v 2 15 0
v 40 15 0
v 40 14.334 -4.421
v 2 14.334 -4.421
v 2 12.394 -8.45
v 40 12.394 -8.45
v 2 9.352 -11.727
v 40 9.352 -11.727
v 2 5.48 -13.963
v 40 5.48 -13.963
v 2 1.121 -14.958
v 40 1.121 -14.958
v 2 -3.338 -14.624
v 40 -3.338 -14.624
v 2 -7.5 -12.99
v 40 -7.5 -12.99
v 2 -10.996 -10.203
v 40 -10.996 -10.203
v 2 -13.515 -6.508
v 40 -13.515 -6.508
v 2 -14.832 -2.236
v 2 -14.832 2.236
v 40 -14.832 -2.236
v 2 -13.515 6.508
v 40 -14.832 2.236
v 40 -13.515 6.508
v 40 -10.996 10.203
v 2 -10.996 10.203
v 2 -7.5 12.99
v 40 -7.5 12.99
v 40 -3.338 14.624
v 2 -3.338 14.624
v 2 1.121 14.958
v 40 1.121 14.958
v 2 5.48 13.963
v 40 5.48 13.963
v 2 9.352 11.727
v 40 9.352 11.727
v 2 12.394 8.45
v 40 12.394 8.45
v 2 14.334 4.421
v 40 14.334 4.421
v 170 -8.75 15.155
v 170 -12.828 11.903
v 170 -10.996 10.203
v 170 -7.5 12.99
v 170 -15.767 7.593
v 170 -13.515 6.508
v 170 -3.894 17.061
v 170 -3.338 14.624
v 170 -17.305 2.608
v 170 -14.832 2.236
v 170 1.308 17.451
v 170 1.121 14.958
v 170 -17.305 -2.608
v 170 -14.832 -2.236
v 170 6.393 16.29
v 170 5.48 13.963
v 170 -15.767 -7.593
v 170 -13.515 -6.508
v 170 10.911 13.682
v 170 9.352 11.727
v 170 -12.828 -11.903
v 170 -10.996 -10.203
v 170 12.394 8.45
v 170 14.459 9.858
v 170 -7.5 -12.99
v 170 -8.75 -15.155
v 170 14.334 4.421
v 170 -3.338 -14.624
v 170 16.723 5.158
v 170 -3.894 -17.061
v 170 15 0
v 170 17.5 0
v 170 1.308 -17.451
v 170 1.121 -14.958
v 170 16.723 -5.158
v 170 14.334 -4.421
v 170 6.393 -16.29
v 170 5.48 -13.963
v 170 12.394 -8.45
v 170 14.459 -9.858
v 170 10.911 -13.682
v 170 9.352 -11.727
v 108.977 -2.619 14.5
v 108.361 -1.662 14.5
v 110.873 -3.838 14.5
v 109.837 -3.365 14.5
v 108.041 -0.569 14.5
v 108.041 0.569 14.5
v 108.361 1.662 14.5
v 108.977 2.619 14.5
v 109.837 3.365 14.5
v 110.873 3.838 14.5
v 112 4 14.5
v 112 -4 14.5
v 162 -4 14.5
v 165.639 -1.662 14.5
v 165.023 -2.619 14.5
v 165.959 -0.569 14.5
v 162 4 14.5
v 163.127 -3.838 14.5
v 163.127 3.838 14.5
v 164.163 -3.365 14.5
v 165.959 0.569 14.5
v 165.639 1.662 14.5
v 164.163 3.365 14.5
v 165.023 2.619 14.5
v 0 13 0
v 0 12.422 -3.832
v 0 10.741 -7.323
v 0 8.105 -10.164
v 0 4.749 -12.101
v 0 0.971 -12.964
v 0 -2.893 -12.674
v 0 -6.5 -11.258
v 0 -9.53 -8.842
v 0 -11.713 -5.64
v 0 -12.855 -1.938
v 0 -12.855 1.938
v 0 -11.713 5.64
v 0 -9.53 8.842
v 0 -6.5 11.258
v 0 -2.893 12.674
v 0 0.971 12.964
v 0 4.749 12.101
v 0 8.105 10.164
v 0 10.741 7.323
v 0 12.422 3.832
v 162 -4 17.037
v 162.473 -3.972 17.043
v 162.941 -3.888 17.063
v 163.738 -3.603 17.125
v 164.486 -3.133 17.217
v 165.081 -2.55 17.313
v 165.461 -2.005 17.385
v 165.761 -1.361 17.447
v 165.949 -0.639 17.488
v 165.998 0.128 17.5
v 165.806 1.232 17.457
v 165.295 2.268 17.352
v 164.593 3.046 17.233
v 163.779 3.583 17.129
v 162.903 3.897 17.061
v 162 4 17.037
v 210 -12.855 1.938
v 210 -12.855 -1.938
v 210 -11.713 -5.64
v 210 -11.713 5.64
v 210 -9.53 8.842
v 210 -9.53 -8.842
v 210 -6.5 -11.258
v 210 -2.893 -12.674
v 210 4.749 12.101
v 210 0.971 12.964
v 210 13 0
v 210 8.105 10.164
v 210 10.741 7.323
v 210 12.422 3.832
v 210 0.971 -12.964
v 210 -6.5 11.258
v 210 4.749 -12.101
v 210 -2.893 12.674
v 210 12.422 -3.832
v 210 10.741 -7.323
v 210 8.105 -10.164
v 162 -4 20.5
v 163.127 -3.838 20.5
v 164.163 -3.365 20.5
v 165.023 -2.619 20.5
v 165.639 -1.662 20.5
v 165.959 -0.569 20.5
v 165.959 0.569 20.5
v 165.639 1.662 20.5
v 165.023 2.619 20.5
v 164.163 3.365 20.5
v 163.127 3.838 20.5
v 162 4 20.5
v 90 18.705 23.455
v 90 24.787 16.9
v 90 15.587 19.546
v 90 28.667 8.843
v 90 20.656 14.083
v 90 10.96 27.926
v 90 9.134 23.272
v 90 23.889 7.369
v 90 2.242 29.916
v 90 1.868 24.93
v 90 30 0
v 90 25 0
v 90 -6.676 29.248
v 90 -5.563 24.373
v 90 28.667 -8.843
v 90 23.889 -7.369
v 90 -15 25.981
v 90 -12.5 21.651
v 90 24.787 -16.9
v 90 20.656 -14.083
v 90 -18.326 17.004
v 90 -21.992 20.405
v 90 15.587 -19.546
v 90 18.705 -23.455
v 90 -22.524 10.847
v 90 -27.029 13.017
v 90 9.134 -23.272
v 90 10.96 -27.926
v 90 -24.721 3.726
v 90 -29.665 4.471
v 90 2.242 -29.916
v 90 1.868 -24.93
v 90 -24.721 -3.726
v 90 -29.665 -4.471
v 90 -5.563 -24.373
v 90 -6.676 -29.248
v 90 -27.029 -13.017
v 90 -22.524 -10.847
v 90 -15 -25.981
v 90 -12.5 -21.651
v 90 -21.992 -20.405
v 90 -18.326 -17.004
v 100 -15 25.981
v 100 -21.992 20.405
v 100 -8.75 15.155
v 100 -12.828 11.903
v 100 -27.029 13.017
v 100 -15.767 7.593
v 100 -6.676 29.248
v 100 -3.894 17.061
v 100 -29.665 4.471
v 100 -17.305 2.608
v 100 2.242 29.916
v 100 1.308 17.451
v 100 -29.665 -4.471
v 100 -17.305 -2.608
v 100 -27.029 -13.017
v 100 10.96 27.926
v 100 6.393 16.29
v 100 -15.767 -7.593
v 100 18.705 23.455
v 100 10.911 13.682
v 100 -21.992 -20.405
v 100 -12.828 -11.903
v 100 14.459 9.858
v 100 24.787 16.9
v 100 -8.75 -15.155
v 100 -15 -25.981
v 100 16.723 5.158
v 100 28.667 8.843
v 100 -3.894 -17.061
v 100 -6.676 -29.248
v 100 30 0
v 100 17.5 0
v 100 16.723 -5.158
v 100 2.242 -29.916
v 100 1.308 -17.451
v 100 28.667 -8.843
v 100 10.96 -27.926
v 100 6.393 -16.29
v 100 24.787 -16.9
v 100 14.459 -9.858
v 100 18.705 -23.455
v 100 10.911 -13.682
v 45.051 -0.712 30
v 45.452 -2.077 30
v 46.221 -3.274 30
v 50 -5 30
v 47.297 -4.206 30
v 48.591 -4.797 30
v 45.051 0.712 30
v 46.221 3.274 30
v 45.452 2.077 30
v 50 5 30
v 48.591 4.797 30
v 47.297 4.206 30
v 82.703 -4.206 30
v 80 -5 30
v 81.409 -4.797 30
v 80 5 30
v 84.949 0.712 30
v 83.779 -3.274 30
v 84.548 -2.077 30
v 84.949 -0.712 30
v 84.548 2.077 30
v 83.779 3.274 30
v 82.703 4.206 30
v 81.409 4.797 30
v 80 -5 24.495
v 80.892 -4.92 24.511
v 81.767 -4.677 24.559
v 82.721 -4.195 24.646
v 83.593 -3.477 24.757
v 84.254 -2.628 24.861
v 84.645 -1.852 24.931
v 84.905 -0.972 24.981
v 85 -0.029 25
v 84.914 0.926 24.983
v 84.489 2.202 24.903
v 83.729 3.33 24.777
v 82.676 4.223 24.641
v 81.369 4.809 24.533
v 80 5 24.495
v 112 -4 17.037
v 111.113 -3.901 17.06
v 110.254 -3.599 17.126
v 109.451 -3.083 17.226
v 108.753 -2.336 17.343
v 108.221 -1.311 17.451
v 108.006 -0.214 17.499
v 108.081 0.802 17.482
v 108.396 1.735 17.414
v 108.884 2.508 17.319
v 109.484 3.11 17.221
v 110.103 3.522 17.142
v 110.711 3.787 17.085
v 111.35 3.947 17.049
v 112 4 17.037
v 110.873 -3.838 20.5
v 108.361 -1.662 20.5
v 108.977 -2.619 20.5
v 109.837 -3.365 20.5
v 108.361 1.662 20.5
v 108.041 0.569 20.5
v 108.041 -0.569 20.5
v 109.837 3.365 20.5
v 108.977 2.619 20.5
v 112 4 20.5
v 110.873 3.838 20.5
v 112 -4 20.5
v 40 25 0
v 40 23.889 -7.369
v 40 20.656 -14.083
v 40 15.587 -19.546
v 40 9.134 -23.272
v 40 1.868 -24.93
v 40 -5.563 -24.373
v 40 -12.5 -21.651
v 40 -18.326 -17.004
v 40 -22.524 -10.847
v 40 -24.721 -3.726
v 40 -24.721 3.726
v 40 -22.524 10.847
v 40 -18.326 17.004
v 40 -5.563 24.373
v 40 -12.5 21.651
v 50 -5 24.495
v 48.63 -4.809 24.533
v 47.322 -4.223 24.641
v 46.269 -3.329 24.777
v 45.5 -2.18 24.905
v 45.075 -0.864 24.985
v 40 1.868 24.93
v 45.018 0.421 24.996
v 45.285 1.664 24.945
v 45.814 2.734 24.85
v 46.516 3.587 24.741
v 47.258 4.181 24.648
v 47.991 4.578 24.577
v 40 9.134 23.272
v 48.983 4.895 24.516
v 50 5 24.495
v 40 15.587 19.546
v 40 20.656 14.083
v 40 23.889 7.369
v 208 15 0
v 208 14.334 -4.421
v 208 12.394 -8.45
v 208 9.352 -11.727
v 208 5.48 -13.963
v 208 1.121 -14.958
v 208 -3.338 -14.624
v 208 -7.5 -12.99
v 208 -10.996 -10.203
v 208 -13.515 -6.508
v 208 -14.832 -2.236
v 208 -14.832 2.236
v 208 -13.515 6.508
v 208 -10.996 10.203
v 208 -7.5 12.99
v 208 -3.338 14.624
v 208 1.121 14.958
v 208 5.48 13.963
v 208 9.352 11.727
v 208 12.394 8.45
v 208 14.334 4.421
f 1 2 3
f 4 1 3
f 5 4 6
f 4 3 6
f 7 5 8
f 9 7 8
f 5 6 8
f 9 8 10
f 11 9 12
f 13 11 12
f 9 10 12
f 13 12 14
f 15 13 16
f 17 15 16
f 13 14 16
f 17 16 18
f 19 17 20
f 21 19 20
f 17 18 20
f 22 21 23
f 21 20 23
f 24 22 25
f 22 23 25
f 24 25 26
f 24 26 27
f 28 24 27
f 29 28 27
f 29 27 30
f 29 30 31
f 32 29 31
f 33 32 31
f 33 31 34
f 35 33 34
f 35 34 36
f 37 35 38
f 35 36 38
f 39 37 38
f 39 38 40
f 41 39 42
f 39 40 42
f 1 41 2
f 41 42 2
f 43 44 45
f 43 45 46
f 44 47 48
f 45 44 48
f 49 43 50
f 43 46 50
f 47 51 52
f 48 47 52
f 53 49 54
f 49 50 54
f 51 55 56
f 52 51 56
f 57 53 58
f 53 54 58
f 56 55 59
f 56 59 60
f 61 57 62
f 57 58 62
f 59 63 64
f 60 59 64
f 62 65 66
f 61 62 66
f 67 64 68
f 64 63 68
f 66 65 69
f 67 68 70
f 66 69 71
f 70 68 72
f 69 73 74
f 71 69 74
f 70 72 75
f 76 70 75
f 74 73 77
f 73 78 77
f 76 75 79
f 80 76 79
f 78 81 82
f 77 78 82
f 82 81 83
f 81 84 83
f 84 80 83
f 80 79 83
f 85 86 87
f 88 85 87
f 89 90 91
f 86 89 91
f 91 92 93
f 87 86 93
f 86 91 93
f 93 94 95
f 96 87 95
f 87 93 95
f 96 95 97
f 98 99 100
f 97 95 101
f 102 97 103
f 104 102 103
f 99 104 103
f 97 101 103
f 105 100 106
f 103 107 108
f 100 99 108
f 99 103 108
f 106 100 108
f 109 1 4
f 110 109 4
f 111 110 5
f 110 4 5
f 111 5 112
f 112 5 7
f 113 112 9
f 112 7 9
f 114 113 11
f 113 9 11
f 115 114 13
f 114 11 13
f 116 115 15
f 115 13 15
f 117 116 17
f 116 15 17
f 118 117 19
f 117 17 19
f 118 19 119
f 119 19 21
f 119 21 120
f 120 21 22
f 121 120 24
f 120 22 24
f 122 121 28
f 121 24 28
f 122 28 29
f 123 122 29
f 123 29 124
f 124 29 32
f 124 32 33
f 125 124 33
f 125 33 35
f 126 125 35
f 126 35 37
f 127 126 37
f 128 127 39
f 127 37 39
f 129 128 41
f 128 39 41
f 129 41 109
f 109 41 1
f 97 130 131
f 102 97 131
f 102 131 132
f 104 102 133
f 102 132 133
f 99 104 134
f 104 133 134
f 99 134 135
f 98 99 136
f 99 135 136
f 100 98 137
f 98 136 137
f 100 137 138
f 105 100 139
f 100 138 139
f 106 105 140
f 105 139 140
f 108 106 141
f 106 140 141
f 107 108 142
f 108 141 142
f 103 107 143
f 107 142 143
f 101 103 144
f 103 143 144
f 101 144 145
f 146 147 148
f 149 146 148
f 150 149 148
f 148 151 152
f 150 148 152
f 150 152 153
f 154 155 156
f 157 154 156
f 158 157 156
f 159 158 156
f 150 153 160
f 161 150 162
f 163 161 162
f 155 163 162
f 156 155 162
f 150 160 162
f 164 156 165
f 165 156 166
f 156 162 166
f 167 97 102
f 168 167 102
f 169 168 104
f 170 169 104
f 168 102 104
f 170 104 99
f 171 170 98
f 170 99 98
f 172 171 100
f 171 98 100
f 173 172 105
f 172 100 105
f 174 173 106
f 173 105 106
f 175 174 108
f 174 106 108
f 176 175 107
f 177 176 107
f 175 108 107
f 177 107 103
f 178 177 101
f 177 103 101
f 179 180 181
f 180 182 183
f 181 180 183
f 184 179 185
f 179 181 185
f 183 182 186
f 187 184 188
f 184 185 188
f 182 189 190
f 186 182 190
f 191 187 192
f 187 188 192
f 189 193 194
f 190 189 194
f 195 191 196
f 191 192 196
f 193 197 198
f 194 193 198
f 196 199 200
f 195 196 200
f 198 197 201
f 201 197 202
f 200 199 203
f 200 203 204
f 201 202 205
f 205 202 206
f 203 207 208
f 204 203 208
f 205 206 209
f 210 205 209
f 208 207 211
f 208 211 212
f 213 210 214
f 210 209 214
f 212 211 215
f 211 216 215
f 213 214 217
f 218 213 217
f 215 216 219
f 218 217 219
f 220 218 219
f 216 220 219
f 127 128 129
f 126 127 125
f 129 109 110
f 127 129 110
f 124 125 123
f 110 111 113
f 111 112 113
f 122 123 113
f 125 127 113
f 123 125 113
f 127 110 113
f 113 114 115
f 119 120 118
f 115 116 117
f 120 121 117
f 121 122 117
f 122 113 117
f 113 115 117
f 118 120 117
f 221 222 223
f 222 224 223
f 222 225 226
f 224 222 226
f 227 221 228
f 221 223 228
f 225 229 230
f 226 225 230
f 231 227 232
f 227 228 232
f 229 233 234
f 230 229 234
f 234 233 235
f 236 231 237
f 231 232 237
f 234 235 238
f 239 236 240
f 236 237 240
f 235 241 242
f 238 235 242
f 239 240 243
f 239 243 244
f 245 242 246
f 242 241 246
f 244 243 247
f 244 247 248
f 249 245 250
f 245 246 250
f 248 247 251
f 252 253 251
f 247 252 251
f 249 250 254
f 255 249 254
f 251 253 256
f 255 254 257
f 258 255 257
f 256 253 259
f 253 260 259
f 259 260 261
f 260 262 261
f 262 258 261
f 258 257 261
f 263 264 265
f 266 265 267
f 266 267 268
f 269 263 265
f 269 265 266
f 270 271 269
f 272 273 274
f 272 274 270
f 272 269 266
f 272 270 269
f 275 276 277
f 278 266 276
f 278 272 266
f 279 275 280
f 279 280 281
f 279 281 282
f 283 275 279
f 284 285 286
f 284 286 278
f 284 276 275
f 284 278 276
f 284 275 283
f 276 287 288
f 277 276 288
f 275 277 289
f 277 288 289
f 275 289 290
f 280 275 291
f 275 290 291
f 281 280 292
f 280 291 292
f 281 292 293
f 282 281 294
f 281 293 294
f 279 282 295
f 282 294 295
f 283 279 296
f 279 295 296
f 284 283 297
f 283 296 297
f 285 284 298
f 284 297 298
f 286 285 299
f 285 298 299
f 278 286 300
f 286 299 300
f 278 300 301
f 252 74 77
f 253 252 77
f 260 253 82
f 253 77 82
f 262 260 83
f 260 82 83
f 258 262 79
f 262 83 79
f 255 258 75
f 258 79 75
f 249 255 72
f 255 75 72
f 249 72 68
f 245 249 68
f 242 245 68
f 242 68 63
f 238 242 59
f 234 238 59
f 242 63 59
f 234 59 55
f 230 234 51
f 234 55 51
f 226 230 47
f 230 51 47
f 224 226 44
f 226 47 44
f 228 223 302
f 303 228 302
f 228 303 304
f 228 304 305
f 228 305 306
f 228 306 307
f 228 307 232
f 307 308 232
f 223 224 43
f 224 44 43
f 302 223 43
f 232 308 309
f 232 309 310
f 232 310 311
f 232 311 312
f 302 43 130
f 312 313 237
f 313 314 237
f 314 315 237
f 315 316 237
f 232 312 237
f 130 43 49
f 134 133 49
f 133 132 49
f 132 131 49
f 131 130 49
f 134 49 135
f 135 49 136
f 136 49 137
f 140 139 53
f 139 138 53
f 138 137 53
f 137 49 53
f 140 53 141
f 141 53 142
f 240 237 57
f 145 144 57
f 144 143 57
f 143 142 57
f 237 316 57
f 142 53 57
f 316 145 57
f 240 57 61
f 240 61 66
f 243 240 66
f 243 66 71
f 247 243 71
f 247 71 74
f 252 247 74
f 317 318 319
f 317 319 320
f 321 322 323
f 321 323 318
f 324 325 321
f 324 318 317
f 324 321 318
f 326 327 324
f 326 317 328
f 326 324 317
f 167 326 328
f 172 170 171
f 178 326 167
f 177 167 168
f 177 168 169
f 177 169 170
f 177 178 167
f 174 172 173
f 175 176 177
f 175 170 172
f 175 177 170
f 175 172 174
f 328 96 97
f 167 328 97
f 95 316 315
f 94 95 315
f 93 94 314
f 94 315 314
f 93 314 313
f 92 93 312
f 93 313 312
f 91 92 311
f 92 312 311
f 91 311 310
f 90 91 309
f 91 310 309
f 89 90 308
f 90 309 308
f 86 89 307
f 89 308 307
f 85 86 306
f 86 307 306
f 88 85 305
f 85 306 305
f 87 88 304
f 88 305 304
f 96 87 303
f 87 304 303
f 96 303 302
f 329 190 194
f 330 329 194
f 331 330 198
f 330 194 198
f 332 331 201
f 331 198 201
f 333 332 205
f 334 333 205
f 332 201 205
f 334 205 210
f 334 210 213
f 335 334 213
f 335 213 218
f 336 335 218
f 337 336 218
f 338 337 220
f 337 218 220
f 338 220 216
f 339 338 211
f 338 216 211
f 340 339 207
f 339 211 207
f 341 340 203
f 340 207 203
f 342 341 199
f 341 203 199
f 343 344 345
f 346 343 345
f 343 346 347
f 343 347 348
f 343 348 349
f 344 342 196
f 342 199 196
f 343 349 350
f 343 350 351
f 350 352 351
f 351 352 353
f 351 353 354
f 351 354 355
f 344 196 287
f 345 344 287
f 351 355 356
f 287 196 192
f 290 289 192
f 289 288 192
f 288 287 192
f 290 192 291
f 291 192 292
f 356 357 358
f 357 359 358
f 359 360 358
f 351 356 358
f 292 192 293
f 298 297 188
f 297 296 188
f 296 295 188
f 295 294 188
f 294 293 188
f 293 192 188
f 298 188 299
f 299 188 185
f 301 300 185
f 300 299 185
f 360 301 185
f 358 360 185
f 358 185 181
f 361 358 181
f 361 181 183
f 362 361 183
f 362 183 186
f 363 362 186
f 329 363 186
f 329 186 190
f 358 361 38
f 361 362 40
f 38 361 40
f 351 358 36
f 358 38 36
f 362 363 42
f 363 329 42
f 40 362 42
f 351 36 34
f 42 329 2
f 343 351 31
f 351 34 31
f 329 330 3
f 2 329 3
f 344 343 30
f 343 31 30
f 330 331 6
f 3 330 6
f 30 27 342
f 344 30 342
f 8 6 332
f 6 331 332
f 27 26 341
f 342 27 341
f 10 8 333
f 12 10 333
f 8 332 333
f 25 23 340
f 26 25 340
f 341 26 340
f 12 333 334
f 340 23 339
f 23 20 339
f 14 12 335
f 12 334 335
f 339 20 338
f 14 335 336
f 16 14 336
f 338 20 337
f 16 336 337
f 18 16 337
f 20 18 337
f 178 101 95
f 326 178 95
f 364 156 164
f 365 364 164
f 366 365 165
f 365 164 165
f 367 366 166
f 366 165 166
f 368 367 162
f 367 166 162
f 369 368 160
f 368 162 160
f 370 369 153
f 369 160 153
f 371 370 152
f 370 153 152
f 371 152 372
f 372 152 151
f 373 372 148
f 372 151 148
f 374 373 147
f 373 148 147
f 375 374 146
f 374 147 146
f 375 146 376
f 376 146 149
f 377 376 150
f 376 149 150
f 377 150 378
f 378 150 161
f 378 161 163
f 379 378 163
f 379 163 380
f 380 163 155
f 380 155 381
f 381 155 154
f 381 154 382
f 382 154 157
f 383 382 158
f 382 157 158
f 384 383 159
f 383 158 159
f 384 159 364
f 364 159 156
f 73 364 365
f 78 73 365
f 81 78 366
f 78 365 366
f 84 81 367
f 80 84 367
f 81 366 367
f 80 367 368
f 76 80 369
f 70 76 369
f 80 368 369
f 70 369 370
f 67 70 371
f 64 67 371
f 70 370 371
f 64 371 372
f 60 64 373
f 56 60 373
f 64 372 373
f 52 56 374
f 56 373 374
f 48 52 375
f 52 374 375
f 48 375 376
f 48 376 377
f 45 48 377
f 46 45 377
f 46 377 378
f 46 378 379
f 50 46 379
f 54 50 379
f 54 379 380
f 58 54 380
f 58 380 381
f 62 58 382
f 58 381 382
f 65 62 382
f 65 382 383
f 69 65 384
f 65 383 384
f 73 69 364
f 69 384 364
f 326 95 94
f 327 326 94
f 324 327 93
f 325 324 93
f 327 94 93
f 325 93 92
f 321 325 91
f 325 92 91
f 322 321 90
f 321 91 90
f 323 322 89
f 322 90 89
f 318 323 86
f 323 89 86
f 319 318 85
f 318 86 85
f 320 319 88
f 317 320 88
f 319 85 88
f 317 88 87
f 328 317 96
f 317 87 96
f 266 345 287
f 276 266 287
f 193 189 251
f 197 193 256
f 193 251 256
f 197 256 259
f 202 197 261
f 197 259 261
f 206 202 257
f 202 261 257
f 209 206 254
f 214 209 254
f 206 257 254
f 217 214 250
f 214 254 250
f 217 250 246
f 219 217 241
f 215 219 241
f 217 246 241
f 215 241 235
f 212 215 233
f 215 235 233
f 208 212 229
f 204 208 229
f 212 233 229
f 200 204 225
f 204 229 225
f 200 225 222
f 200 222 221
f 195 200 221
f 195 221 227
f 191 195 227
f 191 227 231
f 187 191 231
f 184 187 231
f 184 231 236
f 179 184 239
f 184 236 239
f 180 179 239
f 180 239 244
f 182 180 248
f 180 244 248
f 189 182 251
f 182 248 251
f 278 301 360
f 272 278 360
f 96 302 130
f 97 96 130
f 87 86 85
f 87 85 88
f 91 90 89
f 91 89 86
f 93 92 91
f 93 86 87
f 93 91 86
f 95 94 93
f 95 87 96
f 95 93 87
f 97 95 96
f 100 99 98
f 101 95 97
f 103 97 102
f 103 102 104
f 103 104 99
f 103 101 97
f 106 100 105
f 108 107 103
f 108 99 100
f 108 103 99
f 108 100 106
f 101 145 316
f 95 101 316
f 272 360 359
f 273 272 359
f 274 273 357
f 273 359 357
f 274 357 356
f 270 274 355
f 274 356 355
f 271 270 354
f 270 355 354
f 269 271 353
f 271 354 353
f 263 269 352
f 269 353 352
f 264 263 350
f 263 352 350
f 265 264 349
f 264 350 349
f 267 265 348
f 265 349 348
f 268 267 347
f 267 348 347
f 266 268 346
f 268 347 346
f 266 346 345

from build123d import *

# Parameters (mm, degrees)
CHAMFER1_SIZE       = 2
CHAMFER2_SIZE       = 2
CUT_EXTRUDE1_DEPTH  = 3
CUT_EXTRUDE2_DEPTH  = 5
BOSS_EXTRUDE2_DEPTH = 6
BOSS_EXTRUDE3_DEPTH = 10


with BuildPart() as part:
    # Sketch1 → Revolve1 (revolve)
    with BuildSketch(Plane.XY):
        Polygon((0, 0), (0, 15), (40, 15), (40, 25), (90, 25), (90, 30), (100, 30), (100, 17.5), (170, 17.5), (170, 15), (210, 15), (210, 0), align=None)
    revolve(axis=Axis((210, 0, 0), (-1, 0, 0)))

    # Chamfer1
    chamfer1_edges = [part.edges().sort_by_distance(p)[0] for p in [
        (0, -15, 0),
    ]]
    chamfer(chamfer1_edges, length=CHAMFER1_SIZE)

    # Chamfer2
    chamfer2_edges = [part.edges().sort_by_distance(p)[0] for p in [
        (210, -15, 0),
    ]]
    chamfer(chamfer2_edges, length=CHAMFER2_SIZE)

    # Sketch2 → Cut-Extrude1 (cut)
    with BuildSketch(Plane.XY.offset(17.5)):
        with BuildLine():
            Line((112, -4), (162, -4))
            ThreePointArc((162, -4), (166, 0), (162, 4))
            Line((162, 4), (112, 4))
            ThreePointArc((112, 4), (108, 0), (112, -4))
        make_face()
    extrude(amount=-CUT_EXTRUDE1_DEPTH, mode=Mode.SUBTRACT)

    # Sketch8 → Cut-Extrude2 (cut)
    with BuildSketch(Plane.XY.offset(25)):
        with BuildLine():
            Line((50, -5), (80, -5))
            ThreePointArc((80, -5), (85, 0), (80, 5))
            Line((80, 5), (50, 5))
            ThreePointArc((50, 5), (45, 0), (50, -5))
        make_face()
    extrude(amount=-CUT_EXTRUDE2_DEPTH, mode=Mode.SUBTRACT)

    # Sketch12 → Boss-Extrude3 (add)
    with BuildSketch(Plane.XY.offset(20)):
        with BuildLine():
            Line((50, -5), (80, -5))
            ThreePointArc((80, -5), (85, 0), (80, 5))
            Line((80, 5), (50, 5))
            ThreePointArc((50, 5), (45, 0), (50, -5))
        make_face()
    extrude(amount=BOSS_EXTRUDE3_DEPTH)


with BuildPart() as body_2:
    # Sketch11 → Boss-Extrude2 (new body)
    with BuildSketch(Plane.XY.offset(14.5)):
        with BuildLine():
            Line((112, -4), (162, -4))
            ThreePointArc((162, -4), (166, 0), (162, 4))
            Line((162, 4), (112, 4))
            ThreePointArc((112, 4), (108, 0), (112, -4))
        make_face()
    extrude(amount=BOSS_EXTRUDE2_DEPTH)


solid = Compound([part.part, body_2.part])
